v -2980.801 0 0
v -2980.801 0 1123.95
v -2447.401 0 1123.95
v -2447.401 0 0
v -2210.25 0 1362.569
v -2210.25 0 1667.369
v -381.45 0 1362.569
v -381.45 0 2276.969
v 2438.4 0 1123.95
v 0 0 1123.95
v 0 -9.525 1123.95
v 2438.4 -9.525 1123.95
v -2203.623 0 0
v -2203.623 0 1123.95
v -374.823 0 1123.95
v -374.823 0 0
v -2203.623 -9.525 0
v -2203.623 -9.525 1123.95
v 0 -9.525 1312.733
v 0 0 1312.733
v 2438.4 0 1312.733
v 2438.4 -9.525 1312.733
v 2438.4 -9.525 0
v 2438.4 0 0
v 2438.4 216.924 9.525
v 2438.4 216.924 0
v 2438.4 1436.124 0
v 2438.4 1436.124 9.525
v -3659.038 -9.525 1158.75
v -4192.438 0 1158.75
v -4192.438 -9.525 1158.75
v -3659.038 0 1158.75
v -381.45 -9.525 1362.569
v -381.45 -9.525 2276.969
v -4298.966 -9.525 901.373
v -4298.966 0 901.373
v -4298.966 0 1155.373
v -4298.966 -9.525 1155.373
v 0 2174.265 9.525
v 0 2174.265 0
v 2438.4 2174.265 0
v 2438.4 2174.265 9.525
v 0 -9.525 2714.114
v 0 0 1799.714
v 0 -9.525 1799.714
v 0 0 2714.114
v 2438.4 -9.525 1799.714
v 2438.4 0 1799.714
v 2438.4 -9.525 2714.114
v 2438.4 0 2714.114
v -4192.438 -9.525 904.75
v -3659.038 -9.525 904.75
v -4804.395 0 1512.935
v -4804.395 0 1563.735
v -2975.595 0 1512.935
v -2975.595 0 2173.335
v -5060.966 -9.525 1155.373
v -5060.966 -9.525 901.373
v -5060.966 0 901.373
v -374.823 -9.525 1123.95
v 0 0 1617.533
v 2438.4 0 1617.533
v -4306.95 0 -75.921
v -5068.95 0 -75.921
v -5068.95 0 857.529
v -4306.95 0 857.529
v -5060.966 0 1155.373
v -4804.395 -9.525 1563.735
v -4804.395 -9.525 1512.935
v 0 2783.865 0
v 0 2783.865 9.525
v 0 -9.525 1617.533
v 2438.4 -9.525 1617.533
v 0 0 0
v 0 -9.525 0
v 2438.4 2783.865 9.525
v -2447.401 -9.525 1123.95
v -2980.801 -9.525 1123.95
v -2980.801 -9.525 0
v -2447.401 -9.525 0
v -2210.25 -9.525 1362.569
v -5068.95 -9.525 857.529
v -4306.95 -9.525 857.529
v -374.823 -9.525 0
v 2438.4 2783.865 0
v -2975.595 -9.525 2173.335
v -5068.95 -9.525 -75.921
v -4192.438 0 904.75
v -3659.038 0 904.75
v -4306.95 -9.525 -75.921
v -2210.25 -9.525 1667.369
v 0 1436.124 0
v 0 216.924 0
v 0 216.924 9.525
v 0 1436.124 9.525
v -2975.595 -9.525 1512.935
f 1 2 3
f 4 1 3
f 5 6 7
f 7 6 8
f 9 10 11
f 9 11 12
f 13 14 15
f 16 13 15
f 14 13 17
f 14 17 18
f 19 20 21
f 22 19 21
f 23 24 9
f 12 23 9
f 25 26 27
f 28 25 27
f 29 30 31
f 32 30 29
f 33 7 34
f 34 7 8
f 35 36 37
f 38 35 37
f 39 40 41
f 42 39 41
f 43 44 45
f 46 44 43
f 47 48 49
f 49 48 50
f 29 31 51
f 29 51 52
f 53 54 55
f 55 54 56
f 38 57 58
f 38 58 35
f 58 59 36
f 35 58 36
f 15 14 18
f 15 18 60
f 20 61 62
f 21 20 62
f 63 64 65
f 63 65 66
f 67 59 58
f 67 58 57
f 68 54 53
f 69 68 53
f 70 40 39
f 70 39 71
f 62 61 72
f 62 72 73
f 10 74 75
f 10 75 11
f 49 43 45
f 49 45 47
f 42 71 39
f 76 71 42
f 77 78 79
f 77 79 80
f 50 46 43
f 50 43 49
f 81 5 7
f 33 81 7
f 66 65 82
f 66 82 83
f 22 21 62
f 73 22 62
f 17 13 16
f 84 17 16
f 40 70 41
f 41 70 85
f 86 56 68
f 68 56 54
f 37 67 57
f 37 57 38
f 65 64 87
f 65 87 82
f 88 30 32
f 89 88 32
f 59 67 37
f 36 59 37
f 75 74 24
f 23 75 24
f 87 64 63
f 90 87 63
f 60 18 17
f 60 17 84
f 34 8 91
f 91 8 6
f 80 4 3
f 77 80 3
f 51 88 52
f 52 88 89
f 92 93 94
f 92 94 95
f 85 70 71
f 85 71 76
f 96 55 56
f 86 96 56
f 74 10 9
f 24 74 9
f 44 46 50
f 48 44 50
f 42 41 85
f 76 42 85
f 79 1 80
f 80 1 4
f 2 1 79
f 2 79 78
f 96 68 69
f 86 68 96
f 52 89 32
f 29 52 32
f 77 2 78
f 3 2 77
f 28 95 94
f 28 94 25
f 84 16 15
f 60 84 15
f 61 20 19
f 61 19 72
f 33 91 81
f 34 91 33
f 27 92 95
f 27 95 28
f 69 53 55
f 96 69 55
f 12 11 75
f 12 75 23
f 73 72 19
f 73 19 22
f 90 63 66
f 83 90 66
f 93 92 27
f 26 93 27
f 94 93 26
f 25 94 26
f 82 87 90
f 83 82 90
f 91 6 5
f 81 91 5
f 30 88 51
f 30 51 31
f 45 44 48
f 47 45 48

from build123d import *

# Parameters (mm, degrees)
F0_W      = 2438.4
F0_H      = 1123.95
F1_DEPTH  = 9.525
F2_W      = 2438.4
F2_H      = 304.8
F3_DEPTH  = 9.525
F4_W      = 2438.4
F4_H      = 914.4
F5_DEPTH  = 9.525
F6_W      = 1828.8
F6_H      = 1123.95
F7_DEPTH  = 9.525
F9_DEPTH  = 9.525
F10_W     = 2438.4
F10_H     = 1219.2
F11_DEPTH = 9.525
F12_W     = 2438.4
F12_H     = 609.6
F13_DEPTH = 9.525
F14_W     = 533.4
F14_H     = 1123.95
F15_DEPTH = 9.525
F17_DEPTH = 9.525
F18_W     = 533.4
F18_H     = 254
F19_DEPTH = 9.525
F20_W     = 762
F20_H     = 254
F21_DEPTH = 9.525
F22_W     = 762
F22_H     = 933.45
F23_DEPTH = 9.525


with BuildPart() as f1:
    # F0 (on Front) → F1 (new body)
    with BuildSketch(Plane.XZ):
        with Locations((1219.2, 561.975)):
            Rectangle(F0_W, F0_H)
    extrude(amount=F1_DEPTH)


with BuildPart() as f3:
    # F2 (on Front) → F3 (new body)
    with BuildSketch(Plane.XZ):
        with Locations((1219.2, 1465.13278)):
            Rectangle(F2_W, F2_H)
    extrude(amount=F3_DEPTH)


with BuildPart() as f5:
    # F4 (on Front) → F5 (new body)
    with BuildSketch(Plane.XZ):
        with Locations((1219.2, 2256.913849)):
            Rectangle(F4_W, F4_H)
    extrude(amount=F5_DEPTH)


with BuildPart() as f7:
    # F6 (on Front) → F7 (new body)
    with BuildSketch(Plane.XZ):
        with Locations((-1289.222927, 561.975)):
            Rectangle(F6_W, F6_H)
    extrude(amount=F7_DEPTH)


with BuildPart() as f9:
    # F8 (on Front) → F9 (new body)
    with BuildSketch(Plane.XZ):
        Polygon((-2210.249582, 1362.569125), (-381.449582, 1362.569125), (-381.449582, 2276.969125), (-2210.249582, 1667.369125), align=None)
    extrude(amount=F9_DEPTH)


with BuildPart() as f11:
    # F10 (on Top) → F11 (new body)
    with BuildSketch(Plane.XY):
        with Locations((1219.2, 826.523817)):
            Rectangle(F10_W, F10_H)
    extrude(amount=F11_DEPTH)


with BuildPart() as f13:
    # F12 (on Top) → F13 (new body)
    with BuildSketch(Plane.XY):
        with Locations((1219.2, 2479.06493)):
            Rectangle(F12_W, F12_H)
    extrude(amount=F13_DEPTH)


with BuildPart() as f15:
    # F14 (on Front) → F15 (new body)
    with BuildSketch(Plane.XZ):
        with Locations((-2714.101266, 561.975)):
            Rectangle(F14_W, F14_H)
    extrude(amount=F15_DEPTH)


with BuildPart() as f17:
    # F16 (on Front) → F17 (new body)
    with BuildSketch(Plane.XZ):
        Polygon((-4804.39535, 1512.935416), (-2975.59535, 1512.935416), (-2975.59535, 2173.335416), (-4804.39535, 1563.735416), align=None)
    extrude(amount=F17_DEPTH)


with BuildPart() as f19:
    # F18 (on Front) → F19 (new body)
    with BuildSketch(Plane.XZ):
        with Locations((-3925.7375, 1031.749729)):
            Rectangle(F18_W, F18_H)
    extrude(amount=F19_DEPTH)


with BuildPart() as f21:
    # F20 (on Front) → F21 (new body)
    with BuildSketch(Plane.XZ):
        with Locations((-4679.965734, 1028.37293)):
            Rectangle(F20_W, F20_H)
    extrude(amount=F21_DEPTH)


with BuildPart() as f23:
    # F22 (on Front) → F23 (new body)
    with BuildSketch(Plane.XZ):
        with Locations((-4687.950373, 390.803728)):
            Rectangle(F22_W, F22_H)
    extrude(amount=F23_DEPTH)


solid = Compound([f1.part, f3.part, f5.part, f7.part, f9.part, f11.part, f13.part, f15.part, f17.part, f19.part, f21.part, f23.part])
